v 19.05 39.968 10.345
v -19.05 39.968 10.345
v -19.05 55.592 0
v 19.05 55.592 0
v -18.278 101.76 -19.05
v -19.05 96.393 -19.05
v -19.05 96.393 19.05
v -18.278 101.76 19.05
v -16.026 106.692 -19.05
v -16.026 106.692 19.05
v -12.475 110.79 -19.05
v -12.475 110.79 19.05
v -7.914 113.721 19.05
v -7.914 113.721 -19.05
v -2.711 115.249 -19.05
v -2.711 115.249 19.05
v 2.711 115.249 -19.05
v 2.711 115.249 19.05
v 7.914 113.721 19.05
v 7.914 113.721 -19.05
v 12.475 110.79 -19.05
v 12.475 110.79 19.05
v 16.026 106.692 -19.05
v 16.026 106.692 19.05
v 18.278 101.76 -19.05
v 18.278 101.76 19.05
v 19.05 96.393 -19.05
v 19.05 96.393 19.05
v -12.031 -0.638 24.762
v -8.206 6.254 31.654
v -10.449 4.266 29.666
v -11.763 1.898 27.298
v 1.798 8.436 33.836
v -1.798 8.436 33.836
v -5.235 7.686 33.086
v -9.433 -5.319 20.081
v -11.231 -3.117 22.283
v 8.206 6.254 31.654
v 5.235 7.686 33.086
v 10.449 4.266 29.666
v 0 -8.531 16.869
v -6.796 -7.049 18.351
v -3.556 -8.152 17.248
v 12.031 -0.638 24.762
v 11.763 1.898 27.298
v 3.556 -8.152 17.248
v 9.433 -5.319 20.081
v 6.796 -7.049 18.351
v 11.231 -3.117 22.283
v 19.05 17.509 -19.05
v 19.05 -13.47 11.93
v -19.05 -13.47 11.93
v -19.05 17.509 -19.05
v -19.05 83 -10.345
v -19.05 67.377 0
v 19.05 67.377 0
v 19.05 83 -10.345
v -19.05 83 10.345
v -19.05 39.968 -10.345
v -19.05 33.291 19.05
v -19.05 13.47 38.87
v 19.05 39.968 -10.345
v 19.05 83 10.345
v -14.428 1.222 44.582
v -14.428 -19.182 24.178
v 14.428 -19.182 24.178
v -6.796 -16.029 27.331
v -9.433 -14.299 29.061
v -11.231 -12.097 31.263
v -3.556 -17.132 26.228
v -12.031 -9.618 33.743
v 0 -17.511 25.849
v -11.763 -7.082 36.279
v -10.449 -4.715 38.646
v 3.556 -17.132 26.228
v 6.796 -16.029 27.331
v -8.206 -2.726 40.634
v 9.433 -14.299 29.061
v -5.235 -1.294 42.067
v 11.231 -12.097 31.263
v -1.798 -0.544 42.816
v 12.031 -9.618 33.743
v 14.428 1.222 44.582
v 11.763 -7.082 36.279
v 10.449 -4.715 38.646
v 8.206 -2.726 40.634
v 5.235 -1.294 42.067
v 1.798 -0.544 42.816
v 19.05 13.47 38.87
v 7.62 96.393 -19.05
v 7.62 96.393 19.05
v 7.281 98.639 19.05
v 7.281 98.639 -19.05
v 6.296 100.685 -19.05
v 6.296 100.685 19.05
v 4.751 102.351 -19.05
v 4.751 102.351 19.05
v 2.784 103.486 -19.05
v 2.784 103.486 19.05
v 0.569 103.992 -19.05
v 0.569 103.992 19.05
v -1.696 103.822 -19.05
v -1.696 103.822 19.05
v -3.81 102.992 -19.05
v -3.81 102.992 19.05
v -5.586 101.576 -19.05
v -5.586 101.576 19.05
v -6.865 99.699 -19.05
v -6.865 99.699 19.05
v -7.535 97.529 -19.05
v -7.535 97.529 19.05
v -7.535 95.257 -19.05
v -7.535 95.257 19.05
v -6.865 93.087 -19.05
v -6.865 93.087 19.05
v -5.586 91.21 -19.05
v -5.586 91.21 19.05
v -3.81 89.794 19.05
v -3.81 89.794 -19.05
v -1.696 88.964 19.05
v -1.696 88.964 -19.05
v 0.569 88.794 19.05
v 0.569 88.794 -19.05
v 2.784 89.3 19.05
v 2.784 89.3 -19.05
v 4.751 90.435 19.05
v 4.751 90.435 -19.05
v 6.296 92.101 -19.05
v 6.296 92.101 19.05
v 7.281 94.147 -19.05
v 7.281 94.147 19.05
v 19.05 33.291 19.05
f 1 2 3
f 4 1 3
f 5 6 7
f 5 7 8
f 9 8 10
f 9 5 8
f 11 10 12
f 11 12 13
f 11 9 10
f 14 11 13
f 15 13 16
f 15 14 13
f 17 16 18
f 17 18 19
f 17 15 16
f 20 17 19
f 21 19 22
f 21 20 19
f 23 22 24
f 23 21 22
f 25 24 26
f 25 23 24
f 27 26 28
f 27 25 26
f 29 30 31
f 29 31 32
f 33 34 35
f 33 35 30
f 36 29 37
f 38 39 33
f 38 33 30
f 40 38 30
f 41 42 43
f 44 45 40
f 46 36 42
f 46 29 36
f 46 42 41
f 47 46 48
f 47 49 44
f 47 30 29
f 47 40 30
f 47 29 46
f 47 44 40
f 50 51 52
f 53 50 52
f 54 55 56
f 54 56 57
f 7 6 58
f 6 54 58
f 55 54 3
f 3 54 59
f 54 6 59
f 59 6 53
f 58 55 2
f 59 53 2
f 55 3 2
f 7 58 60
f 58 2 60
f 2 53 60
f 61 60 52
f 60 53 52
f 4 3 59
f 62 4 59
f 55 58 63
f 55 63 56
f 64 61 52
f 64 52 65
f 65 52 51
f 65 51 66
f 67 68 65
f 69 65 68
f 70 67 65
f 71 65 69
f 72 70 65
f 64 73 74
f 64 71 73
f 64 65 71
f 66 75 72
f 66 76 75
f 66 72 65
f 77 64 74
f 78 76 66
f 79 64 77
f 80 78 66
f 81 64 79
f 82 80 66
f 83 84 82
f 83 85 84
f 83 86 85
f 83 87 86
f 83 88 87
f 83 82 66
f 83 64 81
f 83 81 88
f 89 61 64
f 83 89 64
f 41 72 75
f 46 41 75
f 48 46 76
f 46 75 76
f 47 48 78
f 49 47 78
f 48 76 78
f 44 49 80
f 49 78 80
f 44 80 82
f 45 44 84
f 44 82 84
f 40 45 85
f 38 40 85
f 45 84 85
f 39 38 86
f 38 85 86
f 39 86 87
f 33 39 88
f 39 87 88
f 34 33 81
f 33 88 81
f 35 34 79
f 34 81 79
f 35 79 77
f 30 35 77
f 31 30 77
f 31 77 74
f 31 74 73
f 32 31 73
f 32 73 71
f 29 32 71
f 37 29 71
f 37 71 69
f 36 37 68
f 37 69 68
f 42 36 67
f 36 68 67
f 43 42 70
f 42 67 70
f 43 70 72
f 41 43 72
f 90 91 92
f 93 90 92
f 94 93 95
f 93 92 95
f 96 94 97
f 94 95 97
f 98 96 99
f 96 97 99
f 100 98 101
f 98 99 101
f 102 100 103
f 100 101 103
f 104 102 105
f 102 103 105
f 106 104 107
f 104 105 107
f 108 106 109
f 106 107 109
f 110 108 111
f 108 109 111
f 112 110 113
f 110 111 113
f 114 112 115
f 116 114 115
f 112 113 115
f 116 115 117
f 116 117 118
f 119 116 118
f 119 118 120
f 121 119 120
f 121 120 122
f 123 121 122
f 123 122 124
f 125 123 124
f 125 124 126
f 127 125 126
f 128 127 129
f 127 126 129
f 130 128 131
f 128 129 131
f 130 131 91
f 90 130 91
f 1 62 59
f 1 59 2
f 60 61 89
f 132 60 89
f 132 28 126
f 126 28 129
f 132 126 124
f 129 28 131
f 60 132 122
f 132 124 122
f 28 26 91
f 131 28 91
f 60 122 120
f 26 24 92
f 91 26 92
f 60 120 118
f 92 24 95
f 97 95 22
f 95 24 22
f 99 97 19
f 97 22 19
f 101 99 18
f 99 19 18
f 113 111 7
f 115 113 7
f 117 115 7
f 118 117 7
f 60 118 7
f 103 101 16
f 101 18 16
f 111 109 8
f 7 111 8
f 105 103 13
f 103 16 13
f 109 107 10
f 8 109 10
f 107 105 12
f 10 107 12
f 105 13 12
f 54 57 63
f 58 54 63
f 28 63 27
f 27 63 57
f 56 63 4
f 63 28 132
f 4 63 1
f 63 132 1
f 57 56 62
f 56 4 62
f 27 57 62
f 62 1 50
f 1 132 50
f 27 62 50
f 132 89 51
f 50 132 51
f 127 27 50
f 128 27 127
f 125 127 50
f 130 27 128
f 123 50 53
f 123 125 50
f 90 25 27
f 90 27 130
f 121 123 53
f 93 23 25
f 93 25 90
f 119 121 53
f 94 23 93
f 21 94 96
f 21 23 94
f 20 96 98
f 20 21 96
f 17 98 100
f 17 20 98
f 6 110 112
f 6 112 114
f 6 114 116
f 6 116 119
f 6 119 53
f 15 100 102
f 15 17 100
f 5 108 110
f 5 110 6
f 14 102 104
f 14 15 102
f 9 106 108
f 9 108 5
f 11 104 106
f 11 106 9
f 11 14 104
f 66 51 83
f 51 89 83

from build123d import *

# Parameters (mm, degrees)
SKETCH11_W          = 38.1
SKETCH11_H          = 38.1
SKETCH12_W          = 38.1
SKETCH12_H          = 38.1
BOSS_EXTRUDE5_DEPTH = 12.7
BOSS_EXTRUDE5_TAPER = 20
BOSS_EXTRUDE6_DEPTH = 38.1
SKETCH14_R          = 7.62
CUT_EXTRUDE2_DEPTH  = 38.1
SKETCH15_R          = 12.065
CUT_EXTRUDE3_DEPTH  = 12.7
CUT_EXTRUDE4_DEPTH  = 38.1


with BuildPart() as part:
    # Sweep1: sweep along a path in Sketch10
    with BuildLine(Plane(origin=(0, 0, 0), x_dir=(0, 0, -1), z_dir=(1, 0, 0))) as sweep1_path:
        Line((0, 96.393), (0, 25.4))
        Line((0, 25.4), (-25.4, 0))
    # Sketch11 → Sweep1 (sweep)
    with BuildSketch(Plane(origin=(0, 96.393, 0), x_dir=(1, 0, 0), z_dir=(0, 1, 0))):
        Rectangle(SKETCH11_W, SKETCH11_H)
    sweep(path=sweep1_path.line, transition=Transition.RIGHT)

    # Sketch12 → Boss-Extrude5 (add)
    with BuildSketch(Plane(origin=(0, -12.7, 12.7), x_dir=(1, 0, 0), z_dir=(0, -0.7071067811865461, 0.7071067811865489))):
        with Locations((0, 17.960512242)):
            Rectangle(SKETCH12_W, SKETCH12_H)
    extrude(amount=BOSS_EXTRUDE5_DEPTH, taper=BOSS_EXTRUDE5_TAPER)

    # Sketch13 → Boss-Extrude6 (add)
    with BuildSketch(Plane(origin=(0, 0, -19.05), x_dir=(-1, 0, 0), z_dir=(0, 0, -1))):
        with BuildLine():
            Line((-19.05, 96.393), (19.05, 96.393))
            ThreePointArc((19.05, 96.393), (0, 115.443), (-19.05, 96.393))
        make_face()
    extrude(amount=-BOSS_EXTRUDE6_DEPTH)

    # Sketch14 → Cut-Extrude2 (cut)
    with BuildSketch(Plane.XY.offset(19.05)):
        with Locations((0, 96.393)):
            Circle(SKETCH14_R)
    extrude(amount=-CUT_EXTRUDE2_DEPTH, mode=Mode.SUBTRACT)

    # Sketch15 → Cut-Extrude3 (cut)
    with BuildSketch(Plane(origin=(0, -21.680256121, 21.680256121), x_dir=(1, 0, 0), z_dir=(0, -0.7071067811865461, 0.7071067811865489))):
        with Locations(Location((0, 17.960512242, 0), (0, 0, 270))):
            Circle(SKETCH15_R)
    extrude(amount=-CUT_EXTRUDE3_DEPTH, mode=Mode.SUBTRACT)

    # Sketch16 → Cut-Extrude4 (cut)
    with BuildSketch(Plane.ZY.offset(19.05)):
        Polygon((-10.345169525, 82.99999799), (10.345169525, 82.99999799), (0, 67.376680748), align=None)
        Polygon((10.345169525, 39.968335079), (0, 55.591652321), (-10.345169525, 39.968335079), align=None)
    extrude(amount=-CUT_EXTRUDE4_DEPTH, mode=Mode.SUBTRACT)


solid = part.part
